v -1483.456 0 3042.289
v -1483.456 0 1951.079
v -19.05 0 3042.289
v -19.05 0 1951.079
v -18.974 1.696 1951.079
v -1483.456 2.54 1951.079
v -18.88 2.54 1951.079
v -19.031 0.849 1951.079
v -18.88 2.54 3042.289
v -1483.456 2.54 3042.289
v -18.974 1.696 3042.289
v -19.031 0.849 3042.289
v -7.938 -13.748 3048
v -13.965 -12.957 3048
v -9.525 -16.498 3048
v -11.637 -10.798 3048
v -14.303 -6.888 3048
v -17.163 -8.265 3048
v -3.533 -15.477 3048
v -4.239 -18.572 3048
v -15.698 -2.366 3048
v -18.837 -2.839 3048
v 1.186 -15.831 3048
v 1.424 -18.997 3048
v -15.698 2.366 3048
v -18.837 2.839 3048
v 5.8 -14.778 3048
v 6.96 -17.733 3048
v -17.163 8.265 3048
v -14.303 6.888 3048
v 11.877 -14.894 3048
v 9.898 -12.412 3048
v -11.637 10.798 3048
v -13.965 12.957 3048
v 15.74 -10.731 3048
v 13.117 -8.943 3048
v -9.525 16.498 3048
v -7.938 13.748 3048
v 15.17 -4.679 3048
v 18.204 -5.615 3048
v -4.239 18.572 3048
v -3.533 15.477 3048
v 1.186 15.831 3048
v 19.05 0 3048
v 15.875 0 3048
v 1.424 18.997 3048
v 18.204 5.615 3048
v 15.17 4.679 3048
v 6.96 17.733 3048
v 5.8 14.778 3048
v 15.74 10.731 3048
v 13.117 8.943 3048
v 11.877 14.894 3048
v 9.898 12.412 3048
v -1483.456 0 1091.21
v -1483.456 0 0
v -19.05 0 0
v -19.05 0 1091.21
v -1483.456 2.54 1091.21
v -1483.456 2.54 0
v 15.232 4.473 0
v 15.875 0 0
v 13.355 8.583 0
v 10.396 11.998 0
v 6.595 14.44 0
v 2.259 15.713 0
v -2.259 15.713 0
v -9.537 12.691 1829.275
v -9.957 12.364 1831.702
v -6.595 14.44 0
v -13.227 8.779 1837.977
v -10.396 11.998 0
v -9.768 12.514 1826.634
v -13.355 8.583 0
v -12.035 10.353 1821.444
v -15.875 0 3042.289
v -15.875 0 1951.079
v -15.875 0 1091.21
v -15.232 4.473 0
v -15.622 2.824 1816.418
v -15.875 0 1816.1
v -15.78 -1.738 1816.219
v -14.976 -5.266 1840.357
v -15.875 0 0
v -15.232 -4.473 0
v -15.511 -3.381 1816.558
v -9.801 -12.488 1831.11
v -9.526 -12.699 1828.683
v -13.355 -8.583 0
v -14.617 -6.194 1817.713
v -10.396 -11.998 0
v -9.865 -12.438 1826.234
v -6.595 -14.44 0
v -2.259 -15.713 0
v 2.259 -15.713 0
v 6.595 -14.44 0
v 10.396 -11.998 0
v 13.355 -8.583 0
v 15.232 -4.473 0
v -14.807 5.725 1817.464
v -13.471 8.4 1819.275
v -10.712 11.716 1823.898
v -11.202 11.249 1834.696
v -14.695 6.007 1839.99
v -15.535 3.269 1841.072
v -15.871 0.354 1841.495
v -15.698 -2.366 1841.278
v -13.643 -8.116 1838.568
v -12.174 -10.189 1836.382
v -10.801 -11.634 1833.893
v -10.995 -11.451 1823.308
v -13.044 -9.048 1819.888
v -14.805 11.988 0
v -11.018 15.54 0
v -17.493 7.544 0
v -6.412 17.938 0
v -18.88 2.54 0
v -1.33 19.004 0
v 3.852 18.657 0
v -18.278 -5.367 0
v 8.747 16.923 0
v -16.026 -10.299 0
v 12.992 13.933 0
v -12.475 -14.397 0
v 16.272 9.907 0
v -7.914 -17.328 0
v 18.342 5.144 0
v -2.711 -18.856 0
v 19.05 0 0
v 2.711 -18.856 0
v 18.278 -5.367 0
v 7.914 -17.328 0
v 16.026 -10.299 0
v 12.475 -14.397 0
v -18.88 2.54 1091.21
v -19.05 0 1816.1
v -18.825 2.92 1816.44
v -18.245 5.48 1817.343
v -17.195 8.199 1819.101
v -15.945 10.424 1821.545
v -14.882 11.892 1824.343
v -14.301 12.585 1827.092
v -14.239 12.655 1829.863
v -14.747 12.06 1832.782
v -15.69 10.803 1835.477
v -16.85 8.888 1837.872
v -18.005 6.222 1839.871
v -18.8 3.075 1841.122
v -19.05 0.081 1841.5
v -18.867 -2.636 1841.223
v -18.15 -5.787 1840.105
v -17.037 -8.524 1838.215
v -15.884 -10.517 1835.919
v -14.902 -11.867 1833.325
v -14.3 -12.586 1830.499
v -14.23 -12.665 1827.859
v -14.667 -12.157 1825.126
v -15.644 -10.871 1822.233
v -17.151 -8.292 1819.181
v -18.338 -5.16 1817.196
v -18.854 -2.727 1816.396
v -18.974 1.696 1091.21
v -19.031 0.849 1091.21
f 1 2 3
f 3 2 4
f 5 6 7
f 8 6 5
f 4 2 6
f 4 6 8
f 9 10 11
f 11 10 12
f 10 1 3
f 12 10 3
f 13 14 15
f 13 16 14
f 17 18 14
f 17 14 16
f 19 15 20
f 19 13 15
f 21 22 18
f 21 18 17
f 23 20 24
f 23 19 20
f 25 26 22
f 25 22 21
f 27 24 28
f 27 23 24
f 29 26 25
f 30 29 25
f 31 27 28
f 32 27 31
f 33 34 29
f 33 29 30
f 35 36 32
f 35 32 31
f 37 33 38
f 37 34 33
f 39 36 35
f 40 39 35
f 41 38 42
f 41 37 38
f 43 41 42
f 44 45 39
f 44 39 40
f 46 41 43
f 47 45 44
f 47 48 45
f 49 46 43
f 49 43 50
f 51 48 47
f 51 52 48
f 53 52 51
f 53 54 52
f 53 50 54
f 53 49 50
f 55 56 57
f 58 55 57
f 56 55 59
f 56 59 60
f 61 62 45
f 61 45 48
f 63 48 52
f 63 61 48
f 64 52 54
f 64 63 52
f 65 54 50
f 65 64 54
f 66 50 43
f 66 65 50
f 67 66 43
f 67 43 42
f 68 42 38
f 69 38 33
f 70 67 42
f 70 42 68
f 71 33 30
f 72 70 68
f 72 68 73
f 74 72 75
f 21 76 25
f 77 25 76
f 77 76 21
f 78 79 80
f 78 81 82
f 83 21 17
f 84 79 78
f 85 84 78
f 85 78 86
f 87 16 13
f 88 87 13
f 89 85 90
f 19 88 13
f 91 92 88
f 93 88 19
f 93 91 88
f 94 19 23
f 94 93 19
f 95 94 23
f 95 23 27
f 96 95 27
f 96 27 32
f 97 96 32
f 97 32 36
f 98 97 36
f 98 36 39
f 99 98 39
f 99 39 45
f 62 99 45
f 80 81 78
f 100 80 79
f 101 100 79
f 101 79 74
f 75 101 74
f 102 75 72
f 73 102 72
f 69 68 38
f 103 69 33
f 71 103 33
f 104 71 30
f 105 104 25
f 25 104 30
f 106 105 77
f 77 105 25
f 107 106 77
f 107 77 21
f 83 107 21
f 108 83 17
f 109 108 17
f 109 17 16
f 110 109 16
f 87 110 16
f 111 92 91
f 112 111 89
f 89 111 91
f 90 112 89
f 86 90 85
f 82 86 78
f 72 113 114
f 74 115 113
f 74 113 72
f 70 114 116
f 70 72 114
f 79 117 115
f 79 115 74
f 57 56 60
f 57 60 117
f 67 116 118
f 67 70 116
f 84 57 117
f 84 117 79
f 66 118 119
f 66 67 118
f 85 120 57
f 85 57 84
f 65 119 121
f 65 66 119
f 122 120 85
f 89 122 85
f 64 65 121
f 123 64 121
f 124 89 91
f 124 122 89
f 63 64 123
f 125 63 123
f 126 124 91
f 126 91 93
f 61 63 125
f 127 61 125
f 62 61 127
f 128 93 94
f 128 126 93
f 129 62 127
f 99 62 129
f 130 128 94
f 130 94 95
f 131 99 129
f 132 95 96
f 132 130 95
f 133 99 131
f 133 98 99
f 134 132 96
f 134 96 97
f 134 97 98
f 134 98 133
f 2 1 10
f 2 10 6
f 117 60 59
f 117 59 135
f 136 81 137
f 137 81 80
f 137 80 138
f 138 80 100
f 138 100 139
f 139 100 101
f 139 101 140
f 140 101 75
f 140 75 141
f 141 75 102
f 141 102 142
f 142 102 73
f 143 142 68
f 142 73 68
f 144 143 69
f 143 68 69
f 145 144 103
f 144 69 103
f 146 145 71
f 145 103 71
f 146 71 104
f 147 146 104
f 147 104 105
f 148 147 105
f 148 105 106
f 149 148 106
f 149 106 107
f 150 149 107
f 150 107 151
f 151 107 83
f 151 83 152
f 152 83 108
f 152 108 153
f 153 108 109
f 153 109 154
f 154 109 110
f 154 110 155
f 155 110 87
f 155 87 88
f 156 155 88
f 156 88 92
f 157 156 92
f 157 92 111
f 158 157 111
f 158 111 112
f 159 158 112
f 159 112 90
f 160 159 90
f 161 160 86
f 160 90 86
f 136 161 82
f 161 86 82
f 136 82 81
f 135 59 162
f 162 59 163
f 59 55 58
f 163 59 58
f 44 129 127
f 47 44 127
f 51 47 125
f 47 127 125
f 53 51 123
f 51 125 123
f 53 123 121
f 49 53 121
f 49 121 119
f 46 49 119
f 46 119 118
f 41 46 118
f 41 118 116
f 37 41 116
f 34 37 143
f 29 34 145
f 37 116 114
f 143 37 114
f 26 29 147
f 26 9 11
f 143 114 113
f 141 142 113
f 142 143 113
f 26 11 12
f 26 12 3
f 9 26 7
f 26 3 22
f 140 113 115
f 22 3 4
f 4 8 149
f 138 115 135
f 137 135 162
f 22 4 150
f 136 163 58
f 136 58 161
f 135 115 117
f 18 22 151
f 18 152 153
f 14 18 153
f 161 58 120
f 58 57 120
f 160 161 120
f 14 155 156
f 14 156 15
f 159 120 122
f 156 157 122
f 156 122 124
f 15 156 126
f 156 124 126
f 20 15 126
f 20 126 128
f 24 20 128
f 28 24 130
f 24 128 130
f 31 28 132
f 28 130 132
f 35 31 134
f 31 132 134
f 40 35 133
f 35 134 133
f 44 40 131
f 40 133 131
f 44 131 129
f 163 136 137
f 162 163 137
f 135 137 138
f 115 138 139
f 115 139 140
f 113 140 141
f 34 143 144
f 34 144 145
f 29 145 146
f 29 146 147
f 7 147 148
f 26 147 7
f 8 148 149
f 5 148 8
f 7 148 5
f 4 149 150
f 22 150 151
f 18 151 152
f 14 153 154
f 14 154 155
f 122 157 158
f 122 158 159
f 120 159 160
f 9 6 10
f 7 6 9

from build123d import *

# Parameters (mm, degrees)
SKETCH1_R           = 19.05
SKETCH1_R_2         = 15.875
BOSS_EXTRUDE1_DEPTH = 3048
SKETCH2_R           = 12.7
CUT_EXTRUDE1_DEPTH  = 20.05
SKETCH3_W           = 1467.580737964
SKETCH3_H           = 1091.209821844
SKETCH3_H_2         = 1091.209821843
BOSS_EXTRUDE2_DEPTH = 2.54


with BuildPart() as part:
    # Sketch1 → Boss-Extrude1 (new body)
    with BuildSketch(Plane.XY):
        Circle(SKETCH1_R)
        Circle(SKETCH1_R_2, mode=Mode.SUBTRACT)
    extrude(amount=BOSS_EXTRUDE1_DEPTH)

    # Sketch2 → Cut-Extrude1 (cut, through all)
    with BuildSketch(Plane(origin=(0, 0, 0), x_dir=(0, 0, -1), z_dir=(1, 0, 0))):
        with Locations((-1828.8, 0)):
            Circle(SKETCH2_R)
    extrude(amount=-CUT_EXTRUDE1_DEPTH, mode=Mode.SUBTRACT)

    # Sketch3 → Boss-Extrude2 (add)
    with BuildSketch(Plane(origin=(0, 0, 0), x_dir=(1, 0, 0), z_dir=(0, 1, 0))):
        with Locations((-749.665368982, -545.604910922)):
            Rectangle(SKETCH3_W, SKETCH3_H)
        with Locations((-749.665368982, -2496.684282285)):
            Rectangle(SKETCH3_W, SKETCH3_H_2)
    extrude(amount=BOSS_EXTRUDE2_DEPTH)


solid = part.part
